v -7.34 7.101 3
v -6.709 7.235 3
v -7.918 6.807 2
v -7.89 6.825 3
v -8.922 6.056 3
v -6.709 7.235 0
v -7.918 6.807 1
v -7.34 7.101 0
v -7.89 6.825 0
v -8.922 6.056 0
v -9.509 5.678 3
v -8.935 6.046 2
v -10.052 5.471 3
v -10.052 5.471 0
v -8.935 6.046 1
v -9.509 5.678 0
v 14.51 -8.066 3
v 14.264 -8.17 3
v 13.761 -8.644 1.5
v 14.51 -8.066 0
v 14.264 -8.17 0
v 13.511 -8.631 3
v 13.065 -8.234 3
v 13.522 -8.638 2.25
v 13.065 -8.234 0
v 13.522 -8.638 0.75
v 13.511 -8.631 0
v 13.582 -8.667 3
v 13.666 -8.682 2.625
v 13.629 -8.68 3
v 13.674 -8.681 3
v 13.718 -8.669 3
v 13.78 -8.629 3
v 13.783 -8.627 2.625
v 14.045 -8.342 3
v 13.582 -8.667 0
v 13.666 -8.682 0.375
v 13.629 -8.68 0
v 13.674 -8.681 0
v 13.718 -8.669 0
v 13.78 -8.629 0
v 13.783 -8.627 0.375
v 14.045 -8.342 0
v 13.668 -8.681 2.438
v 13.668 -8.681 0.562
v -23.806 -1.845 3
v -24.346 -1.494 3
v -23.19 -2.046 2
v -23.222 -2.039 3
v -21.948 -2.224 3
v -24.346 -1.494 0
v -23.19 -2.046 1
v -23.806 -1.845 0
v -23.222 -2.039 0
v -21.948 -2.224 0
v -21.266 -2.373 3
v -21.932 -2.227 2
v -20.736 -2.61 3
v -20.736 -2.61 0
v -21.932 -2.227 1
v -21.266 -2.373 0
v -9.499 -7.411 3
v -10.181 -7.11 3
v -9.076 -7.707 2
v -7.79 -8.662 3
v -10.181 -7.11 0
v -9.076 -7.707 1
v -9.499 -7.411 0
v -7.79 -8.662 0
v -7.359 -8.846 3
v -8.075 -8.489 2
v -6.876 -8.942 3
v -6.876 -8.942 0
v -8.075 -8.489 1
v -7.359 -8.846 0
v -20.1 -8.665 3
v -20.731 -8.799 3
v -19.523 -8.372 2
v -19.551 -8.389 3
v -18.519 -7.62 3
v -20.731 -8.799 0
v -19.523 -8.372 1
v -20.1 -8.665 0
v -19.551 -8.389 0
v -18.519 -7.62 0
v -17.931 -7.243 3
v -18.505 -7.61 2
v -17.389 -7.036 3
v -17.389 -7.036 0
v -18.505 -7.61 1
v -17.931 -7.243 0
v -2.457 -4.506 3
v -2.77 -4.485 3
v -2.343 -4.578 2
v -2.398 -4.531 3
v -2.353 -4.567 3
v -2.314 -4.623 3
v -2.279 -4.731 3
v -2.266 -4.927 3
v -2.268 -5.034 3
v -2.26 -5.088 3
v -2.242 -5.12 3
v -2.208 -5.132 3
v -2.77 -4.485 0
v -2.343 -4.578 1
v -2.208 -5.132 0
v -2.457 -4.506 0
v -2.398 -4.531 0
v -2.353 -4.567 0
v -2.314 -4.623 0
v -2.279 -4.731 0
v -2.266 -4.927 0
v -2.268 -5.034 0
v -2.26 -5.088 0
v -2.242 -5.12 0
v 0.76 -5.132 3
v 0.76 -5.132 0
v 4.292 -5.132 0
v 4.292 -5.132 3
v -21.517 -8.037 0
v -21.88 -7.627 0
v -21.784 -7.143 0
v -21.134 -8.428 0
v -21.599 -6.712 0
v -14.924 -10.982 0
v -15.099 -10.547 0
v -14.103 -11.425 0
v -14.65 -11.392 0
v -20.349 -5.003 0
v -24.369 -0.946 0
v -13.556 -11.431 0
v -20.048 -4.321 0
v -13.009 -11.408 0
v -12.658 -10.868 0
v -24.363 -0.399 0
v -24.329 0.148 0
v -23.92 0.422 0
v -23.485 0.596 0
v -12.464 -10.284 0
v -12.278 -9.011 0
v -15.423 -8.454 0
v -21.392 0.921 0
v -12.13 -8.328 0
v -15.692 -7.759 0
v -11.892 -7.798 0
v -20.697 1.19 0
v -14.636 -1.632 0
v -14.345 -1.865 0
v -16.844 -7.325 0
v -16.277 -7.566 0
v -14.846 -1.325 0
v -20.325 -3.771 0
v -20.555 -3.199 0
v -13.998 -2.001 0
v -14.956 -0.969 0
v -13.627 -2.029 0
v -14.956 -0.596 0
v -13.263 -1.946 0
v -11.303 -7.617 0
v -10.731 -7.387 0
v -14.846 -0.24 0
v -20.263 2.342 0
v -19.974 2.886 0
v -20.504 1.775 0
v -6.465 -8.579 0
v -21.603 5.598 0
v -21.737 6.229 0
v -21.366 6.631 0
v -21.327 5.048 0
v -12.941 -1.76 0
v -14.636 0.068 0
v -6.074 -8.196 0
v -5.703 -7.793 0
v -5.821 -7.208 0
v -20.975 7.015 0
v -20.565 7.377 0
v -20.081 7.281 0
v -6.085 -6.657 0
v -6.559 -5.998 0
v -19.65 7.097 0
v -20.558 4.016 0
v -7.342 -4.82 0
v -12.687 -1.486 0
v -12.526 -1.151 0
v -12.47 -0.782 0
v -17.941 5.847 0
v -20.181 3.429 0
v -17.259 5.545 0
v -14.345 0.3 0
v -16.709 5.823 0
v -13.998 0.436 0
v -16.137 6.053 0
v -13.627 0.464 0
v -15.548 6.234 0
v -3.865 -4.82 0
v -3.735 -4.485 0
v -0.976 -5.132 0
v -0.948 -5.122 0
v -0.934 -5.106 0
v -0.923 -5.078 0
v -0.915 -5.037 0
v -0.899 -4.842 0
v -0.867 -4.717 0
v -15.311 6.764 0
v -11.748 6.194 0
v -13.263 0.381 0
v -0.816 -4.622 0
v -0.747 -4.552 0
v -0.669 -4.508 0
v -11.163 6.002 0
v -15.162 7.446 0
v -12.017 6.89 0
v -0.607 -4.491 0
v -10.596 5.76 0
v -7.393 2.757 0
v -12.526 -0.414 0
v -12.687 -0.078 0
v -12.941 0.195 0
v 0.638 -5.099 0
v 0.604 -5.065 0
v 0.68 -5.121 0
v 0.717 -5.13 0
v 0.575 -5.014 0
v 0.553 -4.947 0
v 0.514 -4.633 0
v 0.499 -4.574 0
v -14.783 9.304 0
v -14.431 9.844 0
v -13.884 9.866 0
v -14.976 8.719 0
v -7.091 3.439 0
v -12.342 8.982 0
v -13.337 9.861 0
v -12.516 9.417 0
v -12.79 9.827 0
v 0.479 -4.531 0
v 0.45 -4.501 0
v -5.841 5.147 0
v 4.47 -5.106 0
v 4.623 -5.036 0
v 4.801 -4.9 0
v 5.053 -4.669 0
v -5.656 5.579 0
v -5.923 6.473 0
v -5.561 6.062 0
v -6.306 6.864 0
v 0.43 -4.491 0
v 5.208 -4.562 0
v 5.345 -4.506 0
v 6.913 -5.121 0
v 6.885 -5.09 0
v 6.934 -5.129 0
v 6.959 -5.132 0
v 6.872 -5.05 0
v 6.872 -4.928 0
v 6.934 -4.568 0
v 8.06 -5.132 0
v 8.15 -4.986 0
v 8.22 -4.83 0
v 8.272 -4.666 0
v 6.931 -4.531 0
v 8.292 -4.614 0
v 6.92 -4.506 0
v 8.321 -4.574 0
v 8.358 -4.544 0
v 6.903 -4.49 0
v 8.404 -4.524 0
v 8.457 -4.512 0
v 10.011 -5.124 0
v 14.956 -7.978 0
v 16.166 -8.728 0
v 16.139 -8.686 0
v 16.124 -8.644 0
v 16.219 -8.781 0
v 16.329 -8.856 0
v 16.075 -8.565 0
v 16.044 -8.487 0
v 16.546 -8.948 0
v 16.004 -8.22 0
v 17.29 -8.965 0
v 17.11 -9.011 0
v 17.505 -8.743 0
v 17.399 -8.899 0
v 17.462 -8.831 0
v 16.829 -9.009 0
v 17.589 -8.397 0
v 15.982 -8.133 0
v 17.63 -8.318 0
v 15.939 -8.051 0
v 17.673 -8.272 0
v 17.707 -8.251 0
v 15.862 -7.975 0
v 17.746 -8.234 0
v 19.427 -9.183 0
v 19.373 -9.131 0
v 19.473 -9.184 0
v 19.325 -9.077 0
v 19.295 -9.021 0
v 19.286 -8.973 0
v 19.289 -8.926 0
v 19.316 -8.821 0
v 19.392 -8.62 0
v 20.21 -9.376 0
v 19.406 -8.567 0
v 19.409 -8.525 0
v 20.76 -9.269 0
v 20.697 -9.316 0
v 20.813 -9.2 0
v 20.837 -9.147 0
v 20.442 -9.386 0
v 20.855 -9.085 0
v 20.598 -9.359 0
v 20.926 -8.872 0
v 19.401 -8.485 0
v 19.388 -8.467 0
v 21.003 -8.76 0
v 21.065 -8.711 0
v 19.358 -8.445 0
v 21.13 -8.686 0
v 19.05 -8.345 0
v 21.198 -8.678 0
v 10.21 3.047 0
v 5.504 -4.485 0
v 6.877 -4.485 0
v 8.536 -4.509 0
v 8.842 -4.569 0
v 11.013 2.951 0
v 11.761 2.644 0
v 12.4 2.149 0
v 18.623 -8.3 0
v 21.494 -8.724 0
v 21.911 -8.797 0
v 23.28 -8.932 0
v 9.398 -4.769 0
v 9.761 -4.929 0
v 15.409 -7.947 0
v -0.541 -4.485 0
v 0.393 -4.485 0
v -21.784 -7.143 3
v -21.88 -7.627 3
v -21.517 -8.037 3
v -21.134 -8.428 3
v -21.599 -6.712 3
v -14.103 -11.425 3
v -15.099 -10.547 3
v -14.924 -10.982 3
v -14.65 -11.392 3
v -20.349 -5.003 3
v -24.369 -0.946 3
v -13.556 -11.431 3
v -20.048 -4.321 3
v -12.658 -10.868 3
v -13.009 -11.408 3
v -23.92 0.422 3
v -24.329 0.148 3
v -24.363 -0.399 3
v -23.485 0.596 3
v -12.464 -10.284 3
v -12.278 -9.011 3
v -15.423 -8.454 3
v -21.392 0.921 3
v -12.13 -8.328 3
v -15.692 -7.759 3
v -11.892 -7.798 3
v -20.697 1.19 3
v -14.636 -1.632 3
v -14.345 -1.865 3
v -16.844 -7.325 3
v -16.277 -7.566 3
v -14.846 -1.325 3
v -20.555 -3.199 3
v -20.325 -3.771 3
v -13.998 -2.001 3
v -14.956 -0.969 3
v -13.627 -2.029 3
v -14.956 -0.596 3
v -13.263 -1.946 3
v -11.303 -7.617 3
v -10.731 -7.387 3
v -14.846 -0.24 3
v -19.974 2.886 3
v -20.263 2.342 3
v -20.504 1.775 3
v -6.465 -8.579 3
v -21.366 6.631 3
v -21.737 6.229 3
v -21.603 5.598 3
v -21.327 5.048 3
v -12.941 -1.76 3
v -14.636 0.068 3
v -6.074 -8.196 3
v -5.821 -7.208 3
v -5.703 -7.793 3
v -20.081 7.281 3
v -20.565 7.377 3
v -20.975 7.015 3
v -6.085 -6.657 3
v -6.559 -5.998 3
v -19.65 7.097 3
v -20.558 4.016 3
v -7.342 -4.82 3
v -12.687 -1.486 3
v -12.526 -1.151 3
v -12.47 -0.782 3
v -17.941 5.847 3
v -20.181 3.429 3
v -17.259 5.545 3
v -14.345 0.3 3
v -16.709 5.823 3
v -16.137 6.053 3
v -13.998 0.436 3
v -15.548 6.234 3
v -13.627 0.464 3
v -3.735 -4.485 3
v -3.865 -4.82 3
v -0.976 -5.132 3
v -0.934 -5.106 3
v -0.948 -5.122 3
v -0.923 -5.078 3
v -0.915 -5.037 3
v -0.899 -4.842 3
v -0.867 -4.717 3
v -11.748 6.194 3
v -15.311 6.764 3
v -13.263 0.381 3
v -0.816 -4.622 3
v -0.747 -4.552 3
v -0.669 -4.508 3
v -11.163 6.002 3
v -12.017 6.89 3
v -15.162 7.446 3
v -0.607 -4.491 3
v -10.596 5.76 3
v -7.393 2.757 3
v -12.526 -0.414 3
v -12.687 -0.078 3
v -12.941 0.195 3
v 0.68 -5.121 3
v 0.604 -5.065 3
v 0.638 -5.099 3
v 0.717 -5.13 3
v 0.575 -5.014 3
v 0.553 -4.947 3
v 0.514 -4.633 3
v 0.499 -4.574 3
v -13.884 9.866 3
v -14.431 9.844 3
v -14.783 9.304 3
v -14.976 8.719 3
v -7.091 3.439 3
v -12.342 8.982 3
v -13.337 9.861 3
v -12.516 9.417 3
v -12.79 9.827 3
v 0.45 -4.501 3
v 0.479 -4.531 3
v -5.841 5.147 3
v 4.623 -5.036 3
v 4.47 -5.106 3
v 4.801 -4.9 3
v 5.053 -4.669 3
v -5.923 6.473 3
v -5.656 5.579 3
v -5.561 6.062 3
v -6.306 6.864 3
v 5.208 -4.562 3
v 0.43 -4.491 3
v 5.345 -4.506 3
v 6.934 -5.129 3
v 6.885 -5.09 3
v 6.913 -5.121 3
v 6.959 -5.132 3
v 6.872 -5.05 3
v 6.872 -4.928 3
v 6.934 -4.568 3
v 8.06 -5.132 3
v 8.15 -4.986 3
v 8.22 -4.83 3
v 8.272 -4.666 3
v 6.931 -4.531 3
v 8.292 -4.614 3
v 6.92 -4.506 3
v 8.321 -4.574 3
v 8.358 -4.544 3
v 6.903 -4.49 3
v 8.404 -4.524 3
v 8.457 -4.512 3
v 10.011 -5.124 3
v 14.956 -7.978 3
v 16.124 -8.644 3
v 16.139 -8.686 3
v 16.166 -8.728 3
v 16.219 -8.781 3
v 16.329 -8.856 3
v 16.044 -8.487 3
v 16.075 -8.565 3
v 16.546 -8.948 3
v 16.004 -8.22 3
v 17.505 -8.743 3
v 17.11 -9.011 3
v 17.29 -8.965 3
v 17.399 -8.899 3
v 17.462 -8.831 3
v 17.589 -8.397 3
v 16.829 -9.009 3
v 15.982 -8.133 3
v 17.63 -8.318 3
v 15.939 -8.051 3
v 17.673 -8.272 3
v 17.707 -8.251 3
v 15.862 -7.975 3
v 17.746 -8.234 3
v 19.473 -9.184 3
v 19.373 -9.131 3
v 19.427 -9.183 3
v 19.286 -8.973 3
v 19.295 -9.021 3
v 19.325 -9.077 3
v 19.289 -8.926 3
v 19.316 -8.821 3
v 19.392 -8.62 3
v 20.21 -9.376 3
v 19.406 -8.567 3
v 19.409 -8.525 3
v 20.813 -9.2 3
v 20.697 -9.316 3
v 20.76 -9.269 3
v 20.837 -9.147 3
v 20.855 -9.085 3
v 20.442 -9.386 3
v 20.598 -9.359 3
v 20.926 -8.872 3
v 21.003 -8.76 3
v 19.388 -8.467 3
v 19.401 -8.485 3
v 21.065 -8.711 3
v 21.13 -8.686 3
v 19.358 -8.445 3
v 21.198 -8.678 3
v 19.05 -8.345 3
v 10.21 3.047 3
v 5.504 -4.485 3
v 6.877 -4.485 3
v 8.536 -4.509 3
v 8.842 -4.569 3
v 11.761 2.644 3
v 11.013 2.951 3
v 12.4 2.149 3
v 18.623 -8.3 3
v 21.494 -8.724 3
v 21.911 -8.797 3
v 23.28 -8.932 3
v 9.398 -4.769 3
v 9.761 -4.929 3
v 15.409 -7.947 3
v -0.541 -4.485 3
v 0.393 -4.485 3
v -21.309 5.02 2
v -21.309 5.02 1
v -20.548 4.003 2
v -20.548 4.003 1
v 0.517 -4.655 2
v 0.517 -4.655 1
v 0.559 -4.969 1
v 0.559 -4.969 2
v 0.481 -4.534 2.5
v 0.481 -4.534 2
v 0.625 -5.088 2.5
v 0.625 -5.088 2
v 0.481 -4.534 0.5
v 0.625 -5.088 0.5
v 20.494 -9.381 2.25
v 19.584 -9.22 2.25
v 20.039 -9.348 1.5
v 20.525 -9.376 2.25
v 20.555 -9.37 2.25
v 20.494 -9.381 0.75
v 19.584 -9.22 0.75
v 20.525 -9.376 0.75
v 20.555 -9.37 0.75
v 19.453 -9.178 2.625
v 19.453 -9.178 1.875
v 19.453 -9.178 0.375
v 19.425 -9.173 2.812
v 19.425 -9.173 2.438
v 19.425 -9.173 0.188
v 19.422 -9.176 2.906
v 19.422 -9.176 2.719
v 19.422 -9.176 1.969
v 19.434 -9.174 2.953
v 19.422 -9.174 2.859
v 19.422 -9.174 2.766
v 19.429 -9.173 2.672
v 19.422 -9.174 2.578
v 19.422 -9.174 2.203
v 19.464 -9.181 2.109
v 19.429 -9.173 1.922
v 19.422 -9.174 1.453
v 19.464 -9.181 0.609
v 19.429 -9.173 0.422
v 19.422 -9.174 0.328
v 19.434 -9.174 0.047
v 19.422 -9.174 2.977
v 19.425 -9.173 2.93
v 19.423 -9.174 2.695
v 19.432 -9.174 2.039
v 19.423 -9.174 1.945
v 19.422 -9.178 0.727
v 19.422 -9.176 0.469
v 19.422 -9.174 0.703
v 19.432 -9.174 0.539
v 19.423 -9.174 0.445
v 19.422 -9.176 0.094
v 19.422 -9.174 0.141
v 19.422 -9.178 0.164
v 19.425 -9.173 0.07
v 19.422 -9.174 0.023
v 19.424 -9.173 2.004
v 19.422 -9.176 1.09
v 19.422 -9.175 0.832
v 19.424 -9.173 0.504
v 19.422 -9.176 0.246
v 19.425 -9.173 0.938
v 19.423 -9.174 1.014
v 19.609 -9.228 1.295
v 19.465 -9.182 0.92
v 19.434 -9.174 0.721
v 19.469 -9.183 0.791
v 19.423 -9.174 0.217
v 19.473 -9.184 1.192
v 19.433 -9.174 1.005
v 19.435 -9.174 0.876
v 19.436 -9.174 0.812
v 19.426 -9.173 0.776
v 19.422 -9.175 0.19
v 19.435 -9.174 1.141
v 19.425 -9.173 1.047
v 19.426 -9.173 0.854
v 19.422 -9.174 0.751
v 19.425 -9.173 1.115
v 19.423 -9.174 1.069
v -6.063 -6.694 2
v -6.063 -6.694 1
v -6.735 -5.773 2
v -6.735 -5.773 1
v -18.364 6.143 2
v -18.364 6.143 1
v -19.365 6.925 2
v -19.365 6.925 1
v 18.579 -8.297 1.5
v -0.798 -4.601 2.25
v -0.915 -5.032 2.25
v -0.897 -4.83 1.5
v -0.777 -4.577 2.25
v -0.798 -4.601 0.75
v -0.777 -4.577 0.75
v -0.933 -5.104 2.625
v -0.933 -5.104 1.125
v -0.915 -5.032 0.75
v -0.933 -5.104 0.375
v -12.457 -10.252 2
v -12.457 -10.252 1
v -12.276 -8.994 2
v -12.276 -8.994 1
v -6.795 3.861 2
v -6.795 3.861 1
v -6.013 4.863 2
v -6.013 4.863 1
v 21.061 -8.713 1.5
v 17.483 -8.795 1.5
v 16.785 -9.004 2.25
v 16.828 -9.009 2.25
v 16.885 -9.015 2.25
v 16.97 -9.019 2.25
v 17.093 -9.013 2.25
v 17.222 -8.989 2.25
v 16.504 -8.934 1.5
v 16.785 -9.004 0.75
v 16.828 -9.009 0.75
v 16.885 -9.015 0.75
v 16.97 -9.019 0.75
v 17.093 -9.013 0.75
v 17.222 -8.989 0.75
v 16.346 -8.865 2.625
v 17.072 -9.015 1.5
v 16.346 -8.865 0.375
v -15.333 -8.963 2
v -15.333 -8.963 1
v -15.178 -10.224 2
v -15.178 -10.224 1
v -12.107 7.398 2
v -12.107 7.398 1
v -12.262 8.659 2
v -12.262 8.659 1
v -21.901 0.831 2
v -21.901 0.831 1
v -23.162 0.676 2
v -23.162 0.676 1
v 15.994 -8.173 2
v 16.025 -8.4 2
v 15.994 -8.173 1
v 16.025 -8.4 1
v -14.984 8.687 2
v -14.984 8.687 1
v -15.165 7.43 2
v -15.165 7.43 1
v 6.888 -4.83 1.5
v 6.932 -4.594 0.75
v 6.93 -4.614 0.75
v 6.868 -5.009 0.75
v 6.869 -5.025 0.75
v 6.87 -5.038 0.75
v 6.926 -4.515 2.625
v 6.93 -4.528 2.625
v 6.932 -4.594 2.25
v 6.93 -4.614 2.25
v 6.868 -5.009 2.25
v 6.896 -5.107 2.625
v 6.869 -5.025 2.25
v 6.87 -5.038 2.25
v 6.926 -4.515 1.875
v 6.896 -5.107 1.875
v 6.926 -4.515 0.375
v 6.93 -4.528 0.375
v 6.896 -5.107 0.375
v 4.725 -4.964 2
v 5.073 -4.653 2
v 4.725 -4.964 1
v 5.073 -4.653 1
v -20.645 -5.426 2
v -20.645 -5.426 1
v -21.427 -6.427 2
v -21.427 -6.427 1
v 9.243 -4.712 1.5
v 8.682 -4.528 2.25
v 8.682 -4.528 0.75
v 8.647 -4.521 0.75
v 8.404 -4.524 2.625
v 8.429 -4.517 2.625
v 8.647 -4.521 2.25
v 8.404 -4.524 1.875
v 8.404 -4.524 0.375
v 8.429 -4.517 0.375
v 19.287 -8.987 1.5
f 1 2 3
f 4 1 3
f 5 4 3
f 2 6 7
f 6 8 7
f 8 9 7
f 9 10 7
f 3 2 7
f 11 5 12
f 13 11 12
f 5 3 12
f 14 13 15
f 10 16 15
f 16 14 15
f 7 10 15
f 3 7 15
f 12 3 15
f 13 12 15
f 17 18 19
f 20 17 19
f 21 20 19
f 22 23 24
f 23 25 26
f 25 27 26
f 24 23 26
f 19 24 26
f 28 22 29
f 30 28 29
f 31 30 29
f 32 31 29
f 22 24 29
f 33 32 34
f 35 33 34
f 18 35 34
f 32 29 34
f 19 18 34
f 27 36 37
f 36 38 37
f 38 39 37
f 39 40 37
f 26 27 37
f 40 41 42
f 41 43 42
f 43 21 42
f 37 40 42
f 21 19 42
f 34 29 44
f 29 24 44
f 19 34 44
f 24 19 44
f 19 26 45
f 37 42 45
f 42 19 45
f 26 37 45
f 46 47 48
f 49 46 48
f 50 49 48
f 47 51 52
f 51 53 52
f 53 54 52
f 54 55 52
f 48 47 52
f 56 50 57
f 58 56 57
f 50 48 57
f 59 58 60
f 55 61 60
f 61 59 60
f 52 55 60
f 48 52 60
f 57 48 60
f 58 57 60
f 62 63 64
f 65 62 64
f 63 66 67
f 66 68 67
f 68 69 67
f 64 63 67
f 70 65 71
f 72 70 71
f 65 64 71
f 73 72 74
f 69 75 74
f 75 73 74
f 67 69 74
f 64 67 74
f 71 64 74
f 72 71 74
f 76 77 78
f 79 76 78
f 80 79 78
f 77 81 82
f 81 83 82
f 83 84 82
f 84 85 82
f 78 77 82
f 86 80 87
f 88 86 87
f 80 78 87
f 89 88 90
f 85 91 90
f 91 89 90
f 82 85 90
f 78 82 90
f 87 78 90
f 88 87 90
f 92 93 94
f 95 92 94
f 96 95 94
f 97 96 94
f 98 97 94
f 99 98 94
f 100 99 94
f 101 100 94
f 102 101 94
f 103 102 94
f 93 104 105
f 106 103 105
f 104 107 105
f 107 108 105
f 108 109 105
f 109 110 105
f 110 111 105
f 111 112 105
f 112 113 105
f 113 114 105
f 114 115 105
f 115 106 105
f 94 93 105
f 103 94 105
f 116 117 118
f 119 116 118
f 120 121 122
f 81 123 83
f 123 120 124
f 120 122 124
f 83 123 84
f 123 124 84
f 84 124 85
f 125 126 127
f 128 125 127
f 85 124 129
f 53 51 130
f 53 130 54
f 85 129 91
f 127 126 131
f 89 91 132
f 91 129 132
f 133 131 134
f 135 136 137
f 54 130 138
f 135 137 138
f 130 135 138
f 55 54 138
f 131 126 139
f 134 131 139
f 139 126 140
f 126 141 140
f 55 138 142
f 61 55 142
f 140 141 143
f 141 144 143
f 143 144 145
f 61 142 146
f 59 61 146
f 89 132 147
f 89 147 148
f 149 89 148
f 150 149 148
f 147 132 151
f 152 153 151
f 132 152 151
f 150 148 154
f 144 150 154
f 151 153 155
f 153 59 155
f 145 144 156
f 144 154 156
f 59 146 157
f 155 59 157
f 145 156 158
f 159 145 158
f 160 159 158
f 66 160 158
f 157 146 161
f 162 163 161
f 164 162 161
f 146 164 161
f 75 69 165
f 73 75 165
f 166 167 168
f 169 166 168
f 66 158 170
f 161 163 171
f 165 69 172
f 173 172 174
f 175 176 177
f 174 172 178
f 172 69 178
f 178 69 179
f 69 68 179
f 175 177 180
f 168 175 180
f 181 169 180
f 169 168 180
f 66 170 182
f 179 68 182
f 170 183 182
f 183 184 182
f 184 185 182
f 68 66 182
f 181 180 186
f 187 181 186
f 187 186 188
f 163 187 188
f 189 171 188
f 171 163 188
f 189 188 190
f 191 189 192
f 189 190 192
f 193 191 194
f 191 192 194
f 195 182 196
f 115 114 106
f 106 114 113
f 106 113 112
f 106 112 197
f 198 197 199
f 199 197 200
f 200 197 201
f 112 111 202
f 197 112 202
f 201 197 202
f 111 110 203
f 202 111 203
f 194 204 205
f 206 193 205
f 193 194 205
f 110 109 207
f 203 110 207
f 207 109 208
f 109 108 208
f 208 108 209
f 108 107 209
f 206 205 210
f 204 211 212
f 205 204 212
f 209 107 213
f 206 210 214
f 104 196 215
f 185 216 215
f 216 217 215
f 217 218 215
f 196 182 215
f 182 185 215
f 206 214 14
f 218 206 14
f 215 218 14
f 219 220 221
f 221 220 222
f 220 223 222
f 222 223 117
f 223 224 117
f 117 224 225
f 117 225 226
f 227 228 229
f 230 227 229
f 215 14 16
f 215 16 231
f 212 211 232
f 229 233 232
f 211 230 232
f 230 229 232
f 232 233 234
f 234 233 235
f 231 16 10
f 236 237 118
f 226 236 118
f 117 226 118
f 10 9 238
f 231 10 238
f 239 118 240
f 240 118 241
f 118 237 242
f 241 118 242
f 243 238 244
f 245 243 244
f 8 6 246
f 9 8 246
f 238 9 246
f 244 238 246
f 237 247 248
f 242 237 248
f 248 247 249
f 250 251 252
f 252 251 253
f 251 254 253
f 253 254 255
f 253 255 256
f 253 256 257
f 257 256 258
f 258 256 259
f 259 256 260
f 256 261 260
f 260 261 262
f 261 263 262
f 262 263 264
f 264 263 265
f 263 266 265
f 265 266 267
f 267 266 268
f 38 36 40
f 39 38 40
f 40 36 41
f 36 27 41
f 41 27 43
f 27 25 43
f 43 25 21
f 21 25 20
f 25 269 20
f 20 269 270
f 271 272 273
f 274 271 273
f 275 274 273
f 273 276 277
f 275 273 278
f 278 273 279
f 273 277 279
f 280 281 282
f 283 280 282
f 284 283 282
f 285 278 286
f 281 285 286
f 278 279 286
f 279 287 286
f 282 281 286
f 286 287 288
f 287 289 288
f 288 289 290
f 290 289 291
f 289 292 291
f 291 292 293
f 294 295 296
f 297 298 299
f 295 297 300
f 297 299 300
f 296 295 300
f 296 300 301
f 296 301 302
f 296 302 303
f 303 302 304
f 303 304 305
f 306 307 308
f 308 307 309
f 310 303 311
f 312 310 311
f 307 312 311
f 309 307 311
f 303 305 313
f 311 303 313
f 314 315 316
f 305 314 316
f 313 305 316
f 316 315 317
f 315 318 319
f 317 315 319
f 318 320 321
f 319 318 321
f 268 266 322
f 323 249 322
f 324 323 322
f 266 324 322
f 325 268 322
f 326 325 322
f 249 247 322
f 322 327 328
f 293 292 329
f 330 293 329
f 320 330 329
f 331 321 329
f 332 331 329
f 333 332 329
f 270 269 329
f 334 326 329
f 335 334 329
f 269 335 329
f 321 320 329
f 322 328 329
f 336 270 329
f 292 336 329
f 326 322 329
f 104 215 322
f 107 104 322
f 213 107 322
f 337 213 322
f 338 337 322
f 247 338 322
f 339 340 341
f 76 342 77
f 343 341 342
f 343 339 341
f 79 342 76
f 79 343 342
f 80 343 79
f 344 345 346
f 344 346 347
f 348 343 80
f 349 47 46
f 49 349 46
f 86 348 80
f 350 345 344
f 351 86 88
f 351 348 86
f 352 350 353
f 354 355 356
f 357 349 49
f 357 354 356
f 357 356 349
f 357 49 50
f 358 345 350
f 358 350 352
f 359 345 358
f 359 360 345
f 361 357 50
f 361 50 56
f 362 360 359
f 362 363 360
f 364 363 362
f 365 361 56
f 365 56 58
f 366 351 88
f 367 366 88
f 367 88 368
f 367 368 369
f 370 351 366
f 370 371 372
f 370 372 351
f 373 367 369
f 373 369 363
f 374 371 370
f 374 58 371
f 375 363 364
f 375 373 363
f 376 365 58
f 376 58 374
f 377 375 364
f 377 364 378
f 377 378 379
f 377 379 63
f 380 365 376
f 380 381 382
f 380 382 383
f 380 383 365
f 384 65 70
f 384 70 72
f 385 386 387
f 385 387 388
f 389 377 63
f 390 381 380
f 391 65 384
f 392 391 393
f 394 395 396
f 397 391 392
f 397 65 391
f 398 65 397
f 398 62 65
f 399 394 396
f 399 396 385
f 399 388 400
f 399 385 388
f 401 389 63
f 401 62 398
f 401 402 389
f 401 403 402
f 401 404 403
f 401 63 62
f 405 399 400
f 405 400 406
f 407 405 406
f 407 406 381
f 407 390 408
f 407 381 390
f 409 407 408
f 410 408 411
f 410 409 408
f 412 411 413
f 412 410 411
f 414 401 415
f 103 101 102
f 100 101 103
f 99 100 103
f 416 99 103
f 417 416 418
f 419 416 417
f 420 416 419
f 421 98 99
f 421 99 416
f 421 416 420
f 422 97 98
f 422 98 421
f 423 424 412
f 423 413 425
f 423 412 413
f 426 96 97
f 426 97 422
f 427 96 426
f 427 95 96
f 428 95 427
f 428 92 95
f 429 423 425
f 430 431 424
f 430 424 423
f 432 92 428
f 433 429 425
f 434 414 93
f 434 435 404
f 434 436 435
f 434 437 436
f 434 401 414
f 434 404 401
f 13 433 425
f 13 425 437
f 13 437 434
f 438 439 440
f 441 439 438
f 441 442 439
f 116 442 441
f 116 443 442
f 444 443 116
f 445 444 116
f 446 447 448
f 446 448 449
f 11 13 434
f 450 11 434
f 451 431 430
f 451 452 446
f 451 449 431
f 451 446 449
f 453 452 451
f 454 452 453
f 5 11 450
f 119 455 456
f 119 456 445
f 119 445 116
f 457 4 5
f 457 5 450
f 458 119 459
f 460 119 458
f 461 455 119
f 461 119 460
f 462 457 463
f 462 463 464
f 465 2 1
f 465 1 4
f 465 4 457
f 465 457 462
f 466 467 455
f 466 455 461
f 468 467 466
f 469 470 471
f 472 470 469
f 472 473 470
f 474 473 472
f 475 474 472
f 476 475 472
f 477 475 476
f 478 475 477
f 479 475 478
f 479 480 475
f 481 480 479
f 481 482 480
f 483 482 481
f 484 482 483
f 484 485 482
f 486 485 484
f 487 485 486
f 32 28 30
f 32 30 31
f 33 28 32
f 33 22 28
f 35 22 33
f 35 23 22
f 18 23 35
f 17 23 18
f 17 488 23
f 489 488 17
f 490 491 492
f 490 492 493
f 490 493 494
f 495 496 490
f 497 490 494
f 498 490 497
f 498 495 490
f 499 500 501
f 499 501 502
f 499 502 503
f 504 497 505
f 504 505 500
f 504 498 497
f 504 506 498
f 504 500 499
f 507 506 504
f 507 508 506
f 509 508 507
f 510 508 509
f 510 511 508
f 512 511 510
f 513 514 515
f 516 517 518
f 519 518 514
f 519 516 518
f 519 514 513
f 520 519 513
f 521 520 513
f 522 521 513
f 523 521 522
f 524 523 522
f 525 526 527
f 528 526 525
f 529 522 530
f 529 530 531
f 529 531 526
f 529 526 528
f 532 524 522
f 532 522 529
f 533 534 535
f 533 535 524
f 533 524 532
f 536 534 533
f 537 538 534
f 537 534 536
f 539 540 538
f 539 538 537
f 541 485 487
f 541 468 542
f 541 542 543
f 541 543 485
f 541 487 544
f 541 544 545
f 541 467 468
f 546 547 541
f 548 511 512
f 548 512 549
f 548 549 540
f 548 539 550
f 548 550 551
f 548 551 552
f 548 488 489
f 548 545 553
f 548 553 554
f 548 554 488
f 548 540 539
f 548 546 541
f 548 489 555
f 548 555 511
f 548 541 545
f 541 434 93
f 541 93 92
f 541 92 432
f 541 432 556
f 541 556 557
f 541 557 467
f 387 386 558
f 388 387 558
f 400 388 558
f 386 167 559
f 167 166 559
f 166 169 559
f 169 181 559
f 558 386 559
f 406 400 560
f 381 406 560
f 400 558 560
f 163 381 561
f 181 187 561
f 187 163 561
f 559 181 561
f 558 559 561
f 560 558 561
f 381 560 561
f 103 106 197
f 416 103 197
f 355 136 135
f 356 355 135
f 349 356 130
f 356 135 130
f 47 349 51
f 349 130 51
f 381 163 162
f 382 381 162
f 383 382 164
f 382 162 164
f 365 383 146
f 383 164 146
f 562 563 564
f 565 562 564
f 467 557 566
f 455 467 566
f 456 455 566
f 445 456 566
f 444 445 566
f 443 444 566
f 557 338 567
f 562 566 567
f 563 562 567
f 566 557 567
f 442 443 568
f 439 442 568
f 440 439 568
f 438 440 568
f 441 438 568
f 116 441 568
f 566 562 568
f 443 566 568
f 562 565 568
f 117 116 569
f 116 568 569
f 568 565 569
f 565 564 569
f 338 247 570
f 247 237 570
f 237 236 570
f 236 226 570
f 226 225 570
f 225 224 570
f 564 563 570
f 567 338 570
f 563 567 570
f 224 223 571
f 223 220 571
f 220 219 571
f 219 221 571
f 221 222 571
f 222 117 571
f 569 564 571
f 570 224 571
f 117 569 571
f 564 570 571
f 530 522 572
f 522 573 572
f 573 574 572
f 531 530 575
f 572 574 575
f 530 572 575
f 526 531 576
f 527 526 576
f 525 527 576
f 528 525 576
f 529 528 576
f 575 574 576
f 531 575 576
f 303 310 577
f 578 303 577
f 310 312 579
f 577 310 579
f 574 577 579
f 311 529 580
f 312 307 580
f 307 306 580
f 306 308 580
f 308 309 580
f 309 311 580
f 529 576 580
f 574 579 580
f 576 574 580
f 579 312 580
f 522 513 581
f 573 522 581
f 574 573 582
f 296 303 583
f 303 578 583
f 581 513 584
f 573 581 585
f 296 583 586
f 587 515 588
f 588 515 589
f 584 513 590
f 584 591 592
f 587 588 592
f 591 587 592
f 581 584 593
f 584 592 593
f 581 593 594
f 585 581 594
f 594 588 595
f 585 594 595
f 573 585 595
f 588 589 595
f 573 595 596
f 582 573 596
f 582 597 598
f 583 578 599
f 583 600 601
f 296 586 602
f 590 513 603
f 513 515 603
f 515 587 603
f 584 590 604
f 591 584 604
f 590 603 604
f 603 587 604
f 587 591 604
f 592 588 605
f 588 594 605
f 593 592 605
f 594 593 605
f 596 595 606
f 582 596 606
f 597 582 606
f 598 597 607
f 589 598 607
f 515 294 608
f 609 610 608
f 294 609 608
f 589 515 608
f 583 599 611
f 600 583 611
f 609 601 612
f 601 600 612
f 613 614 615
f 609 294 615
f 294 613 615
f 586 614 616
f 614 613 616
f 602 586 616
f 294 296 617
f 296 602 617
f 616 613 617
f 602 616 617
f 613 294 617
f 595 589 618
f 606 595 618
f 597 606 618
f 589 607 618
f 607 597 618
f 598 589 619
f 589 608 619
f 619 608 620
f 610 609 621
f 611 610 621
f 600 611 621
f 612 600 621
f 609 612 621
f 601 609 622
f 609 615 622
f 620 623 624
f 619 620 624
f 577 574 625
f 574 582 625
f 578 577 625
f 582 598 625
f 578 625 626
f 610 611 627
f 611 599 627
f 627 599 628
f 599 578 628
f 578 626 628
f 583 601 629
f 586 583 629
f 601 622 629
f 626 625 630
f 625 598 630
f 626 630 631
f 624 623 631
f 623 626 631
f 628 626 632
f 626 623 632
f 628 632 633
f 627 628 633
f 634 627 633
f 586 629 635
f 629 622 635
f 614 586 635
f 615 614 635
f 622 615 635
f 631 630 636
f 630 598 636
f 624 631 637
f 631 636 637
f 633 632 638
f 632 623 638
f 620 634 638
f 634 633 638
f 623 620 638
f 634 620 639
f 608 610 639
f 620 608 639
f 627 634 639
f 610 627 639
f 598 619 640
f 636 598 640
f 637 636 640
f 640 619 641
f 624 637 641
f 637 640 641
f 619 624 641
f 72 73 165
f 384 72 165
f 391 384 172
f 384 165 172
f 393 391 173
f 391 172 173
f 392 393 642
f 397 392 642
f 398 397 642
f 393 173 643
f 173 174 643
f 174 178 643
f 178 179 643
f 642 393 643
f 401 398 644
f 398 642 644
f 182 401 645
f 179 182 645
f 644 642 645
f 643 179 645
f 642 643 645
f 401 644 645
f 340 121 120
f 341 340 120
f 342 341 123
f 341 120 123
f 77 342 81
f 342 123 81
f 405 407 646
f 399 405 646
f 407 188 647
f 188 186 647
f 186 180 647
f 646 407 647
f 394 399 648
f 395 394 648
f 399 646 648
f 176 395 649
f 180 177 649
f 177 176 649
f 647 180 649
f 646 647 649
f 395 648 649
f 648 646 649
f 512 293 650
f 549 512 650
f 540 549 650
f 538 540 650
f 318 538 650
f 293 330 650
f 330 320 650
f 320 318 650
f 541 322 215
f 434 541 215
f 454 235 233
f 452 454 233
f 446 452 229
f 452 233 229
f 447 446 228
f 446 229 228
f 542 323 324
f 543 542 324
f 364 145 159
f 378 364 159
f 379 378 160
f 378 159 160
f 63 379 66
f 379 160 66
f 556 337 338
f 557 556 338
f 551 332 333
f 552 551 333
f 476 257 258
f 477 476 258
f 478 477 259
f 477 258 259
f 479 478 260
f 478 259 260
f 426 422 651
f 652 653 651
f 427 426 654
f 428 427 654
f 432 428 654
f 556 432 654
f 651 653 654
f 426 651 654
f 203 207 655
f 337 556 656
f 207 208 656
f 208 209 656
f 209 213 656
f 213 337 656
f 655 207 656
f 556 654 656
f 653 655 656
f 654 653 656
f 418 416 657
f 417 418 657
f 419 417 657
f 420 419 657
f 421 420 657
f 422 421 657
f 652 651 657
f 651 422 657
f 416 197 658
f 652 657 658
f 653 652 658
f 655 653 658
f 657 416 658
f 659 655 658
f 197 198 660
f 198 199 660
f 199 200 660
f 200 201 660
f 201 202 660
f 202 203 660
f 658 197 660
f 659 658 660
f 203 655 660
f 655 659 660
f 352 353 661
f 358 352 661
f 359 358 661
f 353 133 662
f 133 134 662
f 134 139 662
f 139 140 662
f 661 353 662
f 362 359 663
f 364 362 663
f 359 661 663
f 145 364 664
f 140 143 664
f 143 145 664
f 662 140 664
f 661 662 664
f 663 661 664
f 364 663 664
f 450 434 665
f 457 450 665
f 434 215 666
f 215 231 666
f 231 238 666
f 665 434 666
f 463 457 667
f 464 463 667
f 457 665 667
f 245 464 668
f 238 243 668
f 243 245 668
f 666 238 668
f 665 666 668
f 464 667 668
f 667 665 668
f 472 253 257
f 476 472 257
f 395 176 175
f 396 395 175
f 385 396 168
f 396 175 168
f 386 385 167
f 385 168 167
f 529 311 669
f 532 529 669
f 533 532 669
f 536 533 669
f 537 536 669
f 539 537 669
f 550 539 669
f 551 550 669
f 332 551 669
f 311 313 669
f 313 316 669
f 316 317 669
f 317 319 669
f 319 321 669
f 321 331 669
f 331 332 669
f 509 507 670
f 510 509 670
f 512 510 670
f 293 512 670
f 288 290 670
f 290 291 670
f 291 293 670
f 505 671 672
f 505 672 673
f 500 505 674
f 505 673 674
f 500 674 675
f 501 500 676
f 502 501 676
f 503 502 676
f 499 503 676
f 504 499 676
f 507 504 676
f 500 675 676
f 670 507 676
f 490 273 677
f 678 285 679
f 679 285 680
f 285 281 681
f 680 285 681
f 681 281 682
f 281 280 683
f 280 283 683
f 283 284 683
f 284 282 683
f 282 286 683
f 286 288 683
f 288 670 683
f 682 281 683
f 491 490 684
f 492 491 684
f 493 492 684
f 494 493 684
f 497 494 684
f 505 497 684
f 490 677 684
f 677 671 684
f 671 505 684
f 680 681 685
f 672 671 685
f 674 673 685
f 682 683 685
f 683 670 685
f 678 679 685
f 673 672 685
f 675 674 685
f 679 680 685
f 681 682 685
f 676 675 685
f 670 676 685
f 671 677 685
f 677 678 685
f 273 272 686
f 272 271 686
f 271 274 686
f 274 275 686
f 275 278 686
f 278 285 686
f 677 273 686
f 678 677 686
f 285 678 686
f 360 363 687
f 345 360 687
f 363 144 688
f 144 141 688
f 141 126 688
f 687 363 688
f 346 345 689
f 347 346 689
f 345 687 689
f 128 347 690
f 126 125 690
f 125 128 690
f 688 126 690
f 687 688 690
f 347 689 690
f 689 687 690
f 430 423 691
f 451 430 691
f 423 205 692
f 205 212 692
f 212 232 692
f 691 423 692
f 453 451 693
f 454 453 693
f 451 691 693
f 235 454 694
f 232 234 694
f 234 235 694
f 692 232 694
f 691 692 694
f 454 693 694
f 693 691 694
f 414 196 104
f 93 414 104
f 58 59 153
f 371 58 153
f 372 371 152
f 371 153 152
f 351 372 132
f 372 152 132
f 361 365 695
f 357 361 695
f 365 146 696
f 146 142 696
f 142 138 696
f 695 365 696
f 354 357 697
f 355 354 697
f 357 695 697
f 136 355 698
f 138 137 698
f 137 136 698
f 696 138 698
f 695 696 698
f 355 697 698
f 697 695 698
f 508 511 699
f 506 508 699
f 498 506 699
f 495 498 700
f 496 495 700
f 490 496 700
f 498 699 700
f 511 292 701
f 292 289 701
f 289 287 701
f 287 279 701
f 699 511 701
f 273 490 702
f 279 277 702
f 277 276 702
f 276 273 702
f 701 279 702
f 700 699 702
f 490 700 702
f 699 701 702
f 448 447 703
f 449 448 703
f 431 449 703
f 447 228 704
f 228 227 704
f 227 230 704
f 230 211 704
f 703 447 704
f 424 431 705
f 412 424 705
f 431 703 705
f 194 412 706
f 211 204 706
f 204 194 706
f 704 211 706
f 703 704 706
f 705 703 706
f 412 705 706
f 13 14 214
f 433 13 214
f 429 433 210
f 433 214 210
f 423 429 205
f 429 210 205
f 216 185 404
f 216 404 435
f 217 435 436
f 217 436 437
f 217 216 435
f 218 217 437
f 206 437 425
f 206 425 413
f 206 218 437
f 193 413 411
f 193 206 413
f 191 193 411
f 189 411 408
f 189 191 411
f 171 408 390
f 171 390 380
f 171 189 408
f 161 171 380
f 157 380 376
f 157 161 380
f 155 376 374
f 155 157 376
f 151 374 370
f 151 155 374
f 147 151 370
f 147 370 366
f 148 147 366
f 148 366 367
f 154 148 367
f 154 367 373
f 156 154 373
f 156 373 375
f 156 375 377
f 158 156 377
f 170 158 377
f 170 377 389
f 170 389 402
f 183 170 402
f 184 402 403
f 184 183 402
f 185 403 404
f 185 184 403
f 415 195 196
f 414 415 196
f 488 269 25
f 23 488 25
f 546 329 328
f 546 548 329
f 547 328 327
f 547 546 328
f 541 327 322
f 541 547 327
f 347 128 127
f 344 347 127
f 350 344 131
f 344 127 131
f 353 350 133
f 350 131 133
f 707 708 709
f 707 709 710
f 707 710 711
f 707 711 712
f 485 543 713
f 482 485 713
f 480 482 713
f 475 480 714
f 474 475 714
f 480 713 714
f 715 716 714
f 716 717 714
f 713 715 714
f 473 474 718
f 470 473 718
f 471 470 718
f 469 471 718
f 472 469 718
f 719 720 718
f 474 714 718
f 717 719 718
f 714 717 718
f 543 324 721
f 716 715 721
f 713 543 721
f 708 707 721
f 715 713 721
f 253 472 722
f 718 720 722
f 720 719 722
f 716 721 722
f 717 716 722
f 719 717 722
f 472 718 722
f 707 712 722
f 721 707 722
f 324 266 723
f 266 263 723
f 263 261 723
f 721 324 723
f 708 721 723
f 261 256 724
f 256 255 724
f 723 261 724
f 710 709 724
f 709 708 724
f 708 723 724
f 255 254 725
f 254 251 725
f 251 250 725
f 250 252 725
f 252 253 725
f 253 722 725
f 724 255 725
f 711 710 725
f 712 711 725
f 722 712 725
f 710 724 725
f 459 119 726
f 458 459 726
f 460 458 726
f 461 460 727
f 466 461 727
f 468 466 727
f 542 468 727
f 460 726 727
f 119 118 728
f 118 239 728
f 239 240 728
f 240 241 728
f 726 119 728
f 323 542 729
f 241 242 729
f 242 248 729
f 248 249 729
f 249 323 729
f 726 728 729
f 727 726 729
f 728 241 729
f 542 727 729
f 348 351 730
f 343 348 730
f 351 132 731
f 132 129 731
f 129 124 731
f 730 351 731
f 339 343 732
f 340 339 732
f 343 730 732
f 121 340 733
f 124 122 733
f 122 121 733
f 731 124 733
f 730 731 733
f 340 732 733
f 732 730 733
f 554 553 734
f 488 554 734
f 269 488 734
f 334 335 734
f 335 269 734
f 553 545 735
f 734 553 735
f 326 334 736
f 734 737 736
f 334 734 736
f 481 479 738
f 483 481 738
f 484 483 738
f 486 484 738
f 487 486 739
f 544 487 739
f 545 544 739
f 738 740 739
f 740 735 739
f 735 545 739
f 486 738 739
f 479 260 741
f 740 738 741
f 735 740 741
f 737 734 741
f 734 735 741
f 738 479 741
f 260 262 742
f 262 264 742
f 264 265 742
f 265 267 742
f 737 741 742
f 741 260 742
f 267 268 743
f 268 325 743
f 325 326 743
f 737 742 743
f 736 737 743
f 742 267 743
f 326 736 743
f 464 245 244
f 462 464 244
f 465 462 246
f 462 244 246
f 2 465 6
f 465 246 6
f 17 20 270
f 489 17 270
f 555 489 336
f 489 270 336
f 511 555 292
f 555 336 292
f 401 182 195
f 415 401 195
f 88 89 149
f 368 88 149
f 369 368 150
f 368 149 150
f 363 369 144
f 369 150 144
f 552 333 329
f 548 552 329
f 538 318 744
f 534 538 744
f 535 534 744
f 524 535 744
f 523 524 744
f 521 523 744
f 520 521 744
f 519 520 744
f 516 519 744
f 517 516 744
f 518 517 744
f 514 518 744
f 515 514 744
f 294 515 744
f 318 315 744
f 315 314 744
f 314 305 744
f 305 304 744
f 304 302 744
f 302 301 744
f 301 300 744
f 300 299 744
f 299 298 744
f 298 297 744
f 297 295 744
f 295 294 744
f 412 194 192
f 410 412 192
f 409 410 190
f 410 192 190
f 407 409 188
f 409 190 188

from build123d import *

# Parameters (mm, degrees)
ESQUISSE1_R        = 1.25
BOSS_EXTRU_1_DEPTH = 3
CONG_1_R           = 3


with BuildPart() as part:
    # Esquisse1 → Boss.-Extru.1 (new body)
    with BuildSketch(Plane.XY):
        with BuildLine():
            Line((-3.734627807, -4.485196705), (-2.769705324, -4.485196705))
            add(Edge.make_bspline(
                [(-2.769705324, -4.485196705), (-2.57713545, -4.485196705), (-2.331722683, -4.468616958), (-2.248675506, -4.80760679), (-2.277734979, -5.132246378), (-2.208021331, -5.132246378)],
                knots=[0, 0, 0, 0, 0.517236937, 0.847970255, 1, 1, 1, 1], degree=3))
            Line((-2.208021331, -5.132246378), (-0.975866285, -5.132246378))
            add(Edge.make_bspline(
                [(-0.975866285, -5.132246378), (-0.897142439, -5.132246378), (-0.949613424, -4.698776801), (-0.728030816, -4.485196705), (-0.540596518, -4.485196705)],
                knots=[0, 0, 0, 0, 0.38684992, 1, 1, 1, 1], degree=3))
            Line((-0.540596518, -4.485196705), (0.393324576, -4.485196705))
            add(Edge.make_bspline(
                [(0.393324576, -4.485196705), (0.638910479, -4.485196705), (0.398984004, -5.143340875), (0.7603007, -5.132246378)],
                knots=[0, 0, 0, 0, 0.869021917, 0.869021917, 0.869021917, 0.869021917], degree=3))
            Line((0.7603007, -5.132246378), (4.291625391, -5.132246378))
            add(Edge.make_bspline(
                [(4.291625391, -5.132246378), (4.823763212, -5.132246378), (4.976277419, -4.485196705), (5.503594727, -4.485196705)],
                knots=[0, 0, 0, 0, 1, 1, 1, 1], degree=3))
            Line((5.503594727, -4.485196705), (6.877458786, -4.485196705))
            add(Edge.make_bspline(
                [(6.877458786, -4.485196705), (6.976617296, -4.485196705), (6.870761733, -4.817189959), (6.846729617, -5.132246378), (6.958669178, -5.132246378)],
                knots=[0, 0, 0, 0, 0.5260163, 1, 1, 1, 1], degree=3))
            Line((6.958669178, -5.132246378), (8.060481342, -5.132246378))
            ThreePointArc((8.060481342, -5.132246378), (8.187383408, -4.908704908), (8.272126679, -4.666025076))
            add(Edge.make_bspline(
                [(8.272126679, -4.666025076), (8.349210597, -4.35873446), (9.337071659, -4.762833371), (9.794300685, -4.903225807), (10.011337039, -5.124277403)],
                knots=[0, 0, 0, 0, 0.527261023, 1, 1, 1, 1], degree=3))
            Line((10.011337039, -5.124277403), (13.064705998, -8.234134663))
            add(Edge.make_bspline(
                [(13.064705998, -8.234134663), (13.490330286, -8.667633137), (13.785649393, -8.827393259), (14.075081613, -8.182351509), (14.510423485, -8.066488675)],
                knots=[0, 0, 0, 0, 0.460710551, 1, 1, 1, 1], degree=3))
            ThreePointArc((14.510423485, -8.066488675), (15.18174267, -7.955441853), (15.861909333, -7.974784957))
            add(Edge.make_bspline(
                [(15.861909333, -7.974784957), (16.10159294, -8.154242616), (15.935166999, -8.395947295), (16.124120253, -8.644016897)],
                knots=[0, 0, 0, 0, 1, 1, 1, 1], degree=3))
            add(Edge.make_bspline(
                [(16.124120253, -8.644016897), (16.184465972, -8.946078243), (17.706516579, -9.350598436), (17.523421123, -8.305406598), (17.746436003, -8.234134662)],
                knots=[0, 0, 0, 0, 0.705660207, 1, 1, 1, 1], degree=3))
            add(Edge.make_bspline(
                [(17.746436003, -8.234134662), (17.783919067, -8.222155683), (18.785606441, -8.326082656), (19.079369937, -8.321210362), (19.357960566, -8.445407054)],
                knots=[0, 0, 0, 0, 0.477700623, 1, 1, 1, 1], degree=3))
            add(Edge.make_bspline(
                [(19.357960566, -8.445407054), (19.512936477, -8.514495866), (19.148661951, -8.951431635), (19.367327137, -9.124426979), (19.427044979, -9.183191482)],
                knots=[0, 0, 0, 0, 0.680948688, 1, 1, 1, 1], degree=3))
            add(Edge.make_bspline(
                [(19.427044979, -9.183191482), (19.377364949, -9.134304547), (20.010743736, -9.420516174), (20.787073768, -9.422210975), (20.854615402, -9.085328222)],
                knots=[0, 0, 0, 0, 0.494582685, 1, 1, 1, 1], degree=3))
            add(Edge.make_bspline(
                [(20.854615402, -9.085328222), (20.889698828, -8.91033984), (21.090420582, -8.529024737), (21.485069525, -8.7550575), (21.911052326, -8.797112462)],
                knots=[0, 0, 0, 0, 0.363922375, 1, 1, 1, 1], degree=3))
            Line((21.911052326, -8.797112462), (23.279849729, -8.932246377))
            Line((23.279849729, -8.932246377), (11.497821027, 3.067753623))
            Line((11.497821027, 3.067753623), (-7.392604605, 2.756774088))
            add(Edge.make_bspline(
                [(-7.392604605, 2.756774088), (-7.058502345, 4.013413813), (-5.676898196, 4.66345538), (-5.560782906, 6.062256835)],
                knots=[0, 0, 0, 0, 1, 1, 1, 1], degree=3))
            ThreePointArc((-5.560782906, 6.062256835), (-6.112383098, 6.67056374), (-6.709211686, 7.234563473))
            add(Edge.make_bspline(
                [(-6.709211686, 7.234563473), (-8.110106161, 7.147254026), (-8.78843753, 5.779317398), (-10.051685597, 5.47114206)],
                knots=[0, 0, 0, 0, 1, 1, 1, 1], degree=3))
            ThreePointArc((-10.051685597, 5.47114206), (-10.876929396, 5.886981094), (-11.748365191, 6.194469441))
            add(Edge.make_bspline(
                [(-11.748365191, 6.194469441), (-12.400697689, 7.319293885), (-11.883404826, 8.755884348), (-12.790400912, 9.827092251)],
                knots=[0, 0, 0, 0, 1, 1, 1, 1], degree=3))
            ThreePointArc((-12.790400912, 9.827092251), (-13.610579085, 9.867189954), (-14.431408663, 9.843976447))
            add(Edge.make_bspline(
                [(-14.431408663, 9.843976447), (-15.360253545, 8.791657362), (-14.872628989, 7.344727385), (-15.547967393, 6.233563239)],
                knots=[0, 0, 0, 0, 1, 1, 1, 1], degree=3))
            ThreePointArc((-15.547967393, 6.233563239), (-16.42554548, 5.944070354), (-17.259170735, 5.545299289))
            add(Edge.make_bspline(
                [(-17.259170735, 5.545299289), (-18.51581046, 5.879401549), (-19.165852027, 7.261005698), (-20.564653482, 7.377120988)],
                knots=[0, 0, 0, 0, 1, 1, 1, 1], degree=3))
            ThreePointArc((-20.564653482, 7.377120988), (-21.172960388, 6.825520796), (-21.73696012, 6.228692208))
            add(Edge.make_bspline(
                [(-21.73696012, 6.228692208), (-21.649650674, 4.827797732), (-20.281714046, 4.149466364), (-19.973538707, 2.886218296)],
                knots=[0, 0, 0, 0, 1, 1, 1, 1], degree=3))
            ThreePointArc((-19.973538707, 2.886218296), (-20.389377741, 2.060974498), (-20.696866088, 1.189538702))
            add(Edge.make_bspline(
                [(-20.696866088, 1.189538702), (-21.821690533, 0.537206205), (-23.258280996, 1.054499067), (-24.329488899, 0.147502982)],
                knots=[0, 0, 0, 0, 1, 1, 1, 1], degree=3))
            ThreePointArc((-24.329488899, 0.147502982), (-24.369586601, -0.672675192), (-24.346373094, -1.493504769))
            add(Edge.make_bspline(
                [(-24.346373094, -1.493504769), (-23.29405401, -2.422349651), (-21.847124033, -1.934725096), (-20.735959887, -2.610063499)],
                knots=[0, 0, 0, 0, 1, 1, 1, 1], degree=3))
            ThreePointArc((-20.735959887, -2.610063499), (-20.446467002, -3.487641586), (-20.047695936, -4.321266841))
            add(Edge.make_bspline(
                [(-20.047695936, -4.321266841), (-20.381798196, -5.577906566), (-21.763402345, -6.227948133), (-21.879517635, -7.626749588)],
                knots=[0, 0, 0, 0, 1, 1, 1, 1], degree=3))
            ThreePointArc((-21.879517635, -7.626749588), (-21.327917444, -8.235056494), (-20.731088855, -8.799056226))
            add(Edge.make_bspline(
                [(-20.731088855, -8.799056226), (-19.33019438, -8.71174678), (-18.651863011, -7.343810152), (-17.388614944, -7.035634814)],
                knots=[0, 0, 0, 0, 1, 1, 1, 1], degree=3))
            ThreePointArc((-17.388614944, -7.035634814), (-16.563371146, -7.451473848), (-15.69193535, -7.758962195))
            add(Edge.make_bspline(
                [(-15.69193535, -7.758962195), (-15.039602853, -8.883786639), (-15.556895715, -10.320377102), (-14.64989963, -11.391585005)],
                knots=[0, 0, 0, 0, 1, 1, 1, 1], degree=3))
            ThreePointArc((-14.64989963, -11.391585005), (-13.829721456, -11.431682707), (-13.008891878, -11.408469201))
            add(Edge.make_bspline(
                [(-13.008891878, -11.408469201), (-12.080046997, -10.356150116), (-12.567671552, -8.909220139), (-11.892333149, -7.798055993)],
                knots=[0, 0, 0, 0, 1, 1, 1, 1], degree=3))
            ThreePointArc((-11.892333149, -7.798055993), (-11.014755062, -7.508563108), (-10.181129806, -7.109792043))
            add(Edge.make_bspline(
                [(-10.181129806, -7.109792043), (-8.924490081, -7.443894302), (-8.274448514, -8.825498451), (-6.875647059, -8.941613741)],
                knots=[0, 0, 0, 0, 1, 1, 1, 1], degree=3))
            ThreePointArc((-6.875647059, -8.941613741), (-6.267340154, -8.39001355), (-5.703340421, -7.793184961))
            add(Edge.make_bspline(
                [(-5.703340421, -7.793184961), (-5.781757205, -6.534974722), (-6.893216754, -5.859634034), (-7.342088148, -4.819882898)],
                knots=[0, 0, 0, 0, 0.898147763, 0.898147763, 0.898147763, 0.898147763], degree=3))
            Line((-7.342088148, -4.819882898), (-3.865202715, -4.819882898))
            Line((-3.865202715, -4.819882898), (-3.734627807, -4.485196705))
        make_face()
        with Locations((-13.720150271, -0.782246377)):
            Circle(ESQUISSE1_R, mode=Mode.SUBTRACT)
    extrude(amount=BOSS_EXTRU_1_DEPTH)

    # Congé1
    cong_1_edges = [part.edges().sort_by_distance(p)[0] for p in [
        (11.497821027, 3.067753623, 1.5),
    ]]
    fillet(cong_1_edges, radius=CONG_1_R)


solid = part.part
